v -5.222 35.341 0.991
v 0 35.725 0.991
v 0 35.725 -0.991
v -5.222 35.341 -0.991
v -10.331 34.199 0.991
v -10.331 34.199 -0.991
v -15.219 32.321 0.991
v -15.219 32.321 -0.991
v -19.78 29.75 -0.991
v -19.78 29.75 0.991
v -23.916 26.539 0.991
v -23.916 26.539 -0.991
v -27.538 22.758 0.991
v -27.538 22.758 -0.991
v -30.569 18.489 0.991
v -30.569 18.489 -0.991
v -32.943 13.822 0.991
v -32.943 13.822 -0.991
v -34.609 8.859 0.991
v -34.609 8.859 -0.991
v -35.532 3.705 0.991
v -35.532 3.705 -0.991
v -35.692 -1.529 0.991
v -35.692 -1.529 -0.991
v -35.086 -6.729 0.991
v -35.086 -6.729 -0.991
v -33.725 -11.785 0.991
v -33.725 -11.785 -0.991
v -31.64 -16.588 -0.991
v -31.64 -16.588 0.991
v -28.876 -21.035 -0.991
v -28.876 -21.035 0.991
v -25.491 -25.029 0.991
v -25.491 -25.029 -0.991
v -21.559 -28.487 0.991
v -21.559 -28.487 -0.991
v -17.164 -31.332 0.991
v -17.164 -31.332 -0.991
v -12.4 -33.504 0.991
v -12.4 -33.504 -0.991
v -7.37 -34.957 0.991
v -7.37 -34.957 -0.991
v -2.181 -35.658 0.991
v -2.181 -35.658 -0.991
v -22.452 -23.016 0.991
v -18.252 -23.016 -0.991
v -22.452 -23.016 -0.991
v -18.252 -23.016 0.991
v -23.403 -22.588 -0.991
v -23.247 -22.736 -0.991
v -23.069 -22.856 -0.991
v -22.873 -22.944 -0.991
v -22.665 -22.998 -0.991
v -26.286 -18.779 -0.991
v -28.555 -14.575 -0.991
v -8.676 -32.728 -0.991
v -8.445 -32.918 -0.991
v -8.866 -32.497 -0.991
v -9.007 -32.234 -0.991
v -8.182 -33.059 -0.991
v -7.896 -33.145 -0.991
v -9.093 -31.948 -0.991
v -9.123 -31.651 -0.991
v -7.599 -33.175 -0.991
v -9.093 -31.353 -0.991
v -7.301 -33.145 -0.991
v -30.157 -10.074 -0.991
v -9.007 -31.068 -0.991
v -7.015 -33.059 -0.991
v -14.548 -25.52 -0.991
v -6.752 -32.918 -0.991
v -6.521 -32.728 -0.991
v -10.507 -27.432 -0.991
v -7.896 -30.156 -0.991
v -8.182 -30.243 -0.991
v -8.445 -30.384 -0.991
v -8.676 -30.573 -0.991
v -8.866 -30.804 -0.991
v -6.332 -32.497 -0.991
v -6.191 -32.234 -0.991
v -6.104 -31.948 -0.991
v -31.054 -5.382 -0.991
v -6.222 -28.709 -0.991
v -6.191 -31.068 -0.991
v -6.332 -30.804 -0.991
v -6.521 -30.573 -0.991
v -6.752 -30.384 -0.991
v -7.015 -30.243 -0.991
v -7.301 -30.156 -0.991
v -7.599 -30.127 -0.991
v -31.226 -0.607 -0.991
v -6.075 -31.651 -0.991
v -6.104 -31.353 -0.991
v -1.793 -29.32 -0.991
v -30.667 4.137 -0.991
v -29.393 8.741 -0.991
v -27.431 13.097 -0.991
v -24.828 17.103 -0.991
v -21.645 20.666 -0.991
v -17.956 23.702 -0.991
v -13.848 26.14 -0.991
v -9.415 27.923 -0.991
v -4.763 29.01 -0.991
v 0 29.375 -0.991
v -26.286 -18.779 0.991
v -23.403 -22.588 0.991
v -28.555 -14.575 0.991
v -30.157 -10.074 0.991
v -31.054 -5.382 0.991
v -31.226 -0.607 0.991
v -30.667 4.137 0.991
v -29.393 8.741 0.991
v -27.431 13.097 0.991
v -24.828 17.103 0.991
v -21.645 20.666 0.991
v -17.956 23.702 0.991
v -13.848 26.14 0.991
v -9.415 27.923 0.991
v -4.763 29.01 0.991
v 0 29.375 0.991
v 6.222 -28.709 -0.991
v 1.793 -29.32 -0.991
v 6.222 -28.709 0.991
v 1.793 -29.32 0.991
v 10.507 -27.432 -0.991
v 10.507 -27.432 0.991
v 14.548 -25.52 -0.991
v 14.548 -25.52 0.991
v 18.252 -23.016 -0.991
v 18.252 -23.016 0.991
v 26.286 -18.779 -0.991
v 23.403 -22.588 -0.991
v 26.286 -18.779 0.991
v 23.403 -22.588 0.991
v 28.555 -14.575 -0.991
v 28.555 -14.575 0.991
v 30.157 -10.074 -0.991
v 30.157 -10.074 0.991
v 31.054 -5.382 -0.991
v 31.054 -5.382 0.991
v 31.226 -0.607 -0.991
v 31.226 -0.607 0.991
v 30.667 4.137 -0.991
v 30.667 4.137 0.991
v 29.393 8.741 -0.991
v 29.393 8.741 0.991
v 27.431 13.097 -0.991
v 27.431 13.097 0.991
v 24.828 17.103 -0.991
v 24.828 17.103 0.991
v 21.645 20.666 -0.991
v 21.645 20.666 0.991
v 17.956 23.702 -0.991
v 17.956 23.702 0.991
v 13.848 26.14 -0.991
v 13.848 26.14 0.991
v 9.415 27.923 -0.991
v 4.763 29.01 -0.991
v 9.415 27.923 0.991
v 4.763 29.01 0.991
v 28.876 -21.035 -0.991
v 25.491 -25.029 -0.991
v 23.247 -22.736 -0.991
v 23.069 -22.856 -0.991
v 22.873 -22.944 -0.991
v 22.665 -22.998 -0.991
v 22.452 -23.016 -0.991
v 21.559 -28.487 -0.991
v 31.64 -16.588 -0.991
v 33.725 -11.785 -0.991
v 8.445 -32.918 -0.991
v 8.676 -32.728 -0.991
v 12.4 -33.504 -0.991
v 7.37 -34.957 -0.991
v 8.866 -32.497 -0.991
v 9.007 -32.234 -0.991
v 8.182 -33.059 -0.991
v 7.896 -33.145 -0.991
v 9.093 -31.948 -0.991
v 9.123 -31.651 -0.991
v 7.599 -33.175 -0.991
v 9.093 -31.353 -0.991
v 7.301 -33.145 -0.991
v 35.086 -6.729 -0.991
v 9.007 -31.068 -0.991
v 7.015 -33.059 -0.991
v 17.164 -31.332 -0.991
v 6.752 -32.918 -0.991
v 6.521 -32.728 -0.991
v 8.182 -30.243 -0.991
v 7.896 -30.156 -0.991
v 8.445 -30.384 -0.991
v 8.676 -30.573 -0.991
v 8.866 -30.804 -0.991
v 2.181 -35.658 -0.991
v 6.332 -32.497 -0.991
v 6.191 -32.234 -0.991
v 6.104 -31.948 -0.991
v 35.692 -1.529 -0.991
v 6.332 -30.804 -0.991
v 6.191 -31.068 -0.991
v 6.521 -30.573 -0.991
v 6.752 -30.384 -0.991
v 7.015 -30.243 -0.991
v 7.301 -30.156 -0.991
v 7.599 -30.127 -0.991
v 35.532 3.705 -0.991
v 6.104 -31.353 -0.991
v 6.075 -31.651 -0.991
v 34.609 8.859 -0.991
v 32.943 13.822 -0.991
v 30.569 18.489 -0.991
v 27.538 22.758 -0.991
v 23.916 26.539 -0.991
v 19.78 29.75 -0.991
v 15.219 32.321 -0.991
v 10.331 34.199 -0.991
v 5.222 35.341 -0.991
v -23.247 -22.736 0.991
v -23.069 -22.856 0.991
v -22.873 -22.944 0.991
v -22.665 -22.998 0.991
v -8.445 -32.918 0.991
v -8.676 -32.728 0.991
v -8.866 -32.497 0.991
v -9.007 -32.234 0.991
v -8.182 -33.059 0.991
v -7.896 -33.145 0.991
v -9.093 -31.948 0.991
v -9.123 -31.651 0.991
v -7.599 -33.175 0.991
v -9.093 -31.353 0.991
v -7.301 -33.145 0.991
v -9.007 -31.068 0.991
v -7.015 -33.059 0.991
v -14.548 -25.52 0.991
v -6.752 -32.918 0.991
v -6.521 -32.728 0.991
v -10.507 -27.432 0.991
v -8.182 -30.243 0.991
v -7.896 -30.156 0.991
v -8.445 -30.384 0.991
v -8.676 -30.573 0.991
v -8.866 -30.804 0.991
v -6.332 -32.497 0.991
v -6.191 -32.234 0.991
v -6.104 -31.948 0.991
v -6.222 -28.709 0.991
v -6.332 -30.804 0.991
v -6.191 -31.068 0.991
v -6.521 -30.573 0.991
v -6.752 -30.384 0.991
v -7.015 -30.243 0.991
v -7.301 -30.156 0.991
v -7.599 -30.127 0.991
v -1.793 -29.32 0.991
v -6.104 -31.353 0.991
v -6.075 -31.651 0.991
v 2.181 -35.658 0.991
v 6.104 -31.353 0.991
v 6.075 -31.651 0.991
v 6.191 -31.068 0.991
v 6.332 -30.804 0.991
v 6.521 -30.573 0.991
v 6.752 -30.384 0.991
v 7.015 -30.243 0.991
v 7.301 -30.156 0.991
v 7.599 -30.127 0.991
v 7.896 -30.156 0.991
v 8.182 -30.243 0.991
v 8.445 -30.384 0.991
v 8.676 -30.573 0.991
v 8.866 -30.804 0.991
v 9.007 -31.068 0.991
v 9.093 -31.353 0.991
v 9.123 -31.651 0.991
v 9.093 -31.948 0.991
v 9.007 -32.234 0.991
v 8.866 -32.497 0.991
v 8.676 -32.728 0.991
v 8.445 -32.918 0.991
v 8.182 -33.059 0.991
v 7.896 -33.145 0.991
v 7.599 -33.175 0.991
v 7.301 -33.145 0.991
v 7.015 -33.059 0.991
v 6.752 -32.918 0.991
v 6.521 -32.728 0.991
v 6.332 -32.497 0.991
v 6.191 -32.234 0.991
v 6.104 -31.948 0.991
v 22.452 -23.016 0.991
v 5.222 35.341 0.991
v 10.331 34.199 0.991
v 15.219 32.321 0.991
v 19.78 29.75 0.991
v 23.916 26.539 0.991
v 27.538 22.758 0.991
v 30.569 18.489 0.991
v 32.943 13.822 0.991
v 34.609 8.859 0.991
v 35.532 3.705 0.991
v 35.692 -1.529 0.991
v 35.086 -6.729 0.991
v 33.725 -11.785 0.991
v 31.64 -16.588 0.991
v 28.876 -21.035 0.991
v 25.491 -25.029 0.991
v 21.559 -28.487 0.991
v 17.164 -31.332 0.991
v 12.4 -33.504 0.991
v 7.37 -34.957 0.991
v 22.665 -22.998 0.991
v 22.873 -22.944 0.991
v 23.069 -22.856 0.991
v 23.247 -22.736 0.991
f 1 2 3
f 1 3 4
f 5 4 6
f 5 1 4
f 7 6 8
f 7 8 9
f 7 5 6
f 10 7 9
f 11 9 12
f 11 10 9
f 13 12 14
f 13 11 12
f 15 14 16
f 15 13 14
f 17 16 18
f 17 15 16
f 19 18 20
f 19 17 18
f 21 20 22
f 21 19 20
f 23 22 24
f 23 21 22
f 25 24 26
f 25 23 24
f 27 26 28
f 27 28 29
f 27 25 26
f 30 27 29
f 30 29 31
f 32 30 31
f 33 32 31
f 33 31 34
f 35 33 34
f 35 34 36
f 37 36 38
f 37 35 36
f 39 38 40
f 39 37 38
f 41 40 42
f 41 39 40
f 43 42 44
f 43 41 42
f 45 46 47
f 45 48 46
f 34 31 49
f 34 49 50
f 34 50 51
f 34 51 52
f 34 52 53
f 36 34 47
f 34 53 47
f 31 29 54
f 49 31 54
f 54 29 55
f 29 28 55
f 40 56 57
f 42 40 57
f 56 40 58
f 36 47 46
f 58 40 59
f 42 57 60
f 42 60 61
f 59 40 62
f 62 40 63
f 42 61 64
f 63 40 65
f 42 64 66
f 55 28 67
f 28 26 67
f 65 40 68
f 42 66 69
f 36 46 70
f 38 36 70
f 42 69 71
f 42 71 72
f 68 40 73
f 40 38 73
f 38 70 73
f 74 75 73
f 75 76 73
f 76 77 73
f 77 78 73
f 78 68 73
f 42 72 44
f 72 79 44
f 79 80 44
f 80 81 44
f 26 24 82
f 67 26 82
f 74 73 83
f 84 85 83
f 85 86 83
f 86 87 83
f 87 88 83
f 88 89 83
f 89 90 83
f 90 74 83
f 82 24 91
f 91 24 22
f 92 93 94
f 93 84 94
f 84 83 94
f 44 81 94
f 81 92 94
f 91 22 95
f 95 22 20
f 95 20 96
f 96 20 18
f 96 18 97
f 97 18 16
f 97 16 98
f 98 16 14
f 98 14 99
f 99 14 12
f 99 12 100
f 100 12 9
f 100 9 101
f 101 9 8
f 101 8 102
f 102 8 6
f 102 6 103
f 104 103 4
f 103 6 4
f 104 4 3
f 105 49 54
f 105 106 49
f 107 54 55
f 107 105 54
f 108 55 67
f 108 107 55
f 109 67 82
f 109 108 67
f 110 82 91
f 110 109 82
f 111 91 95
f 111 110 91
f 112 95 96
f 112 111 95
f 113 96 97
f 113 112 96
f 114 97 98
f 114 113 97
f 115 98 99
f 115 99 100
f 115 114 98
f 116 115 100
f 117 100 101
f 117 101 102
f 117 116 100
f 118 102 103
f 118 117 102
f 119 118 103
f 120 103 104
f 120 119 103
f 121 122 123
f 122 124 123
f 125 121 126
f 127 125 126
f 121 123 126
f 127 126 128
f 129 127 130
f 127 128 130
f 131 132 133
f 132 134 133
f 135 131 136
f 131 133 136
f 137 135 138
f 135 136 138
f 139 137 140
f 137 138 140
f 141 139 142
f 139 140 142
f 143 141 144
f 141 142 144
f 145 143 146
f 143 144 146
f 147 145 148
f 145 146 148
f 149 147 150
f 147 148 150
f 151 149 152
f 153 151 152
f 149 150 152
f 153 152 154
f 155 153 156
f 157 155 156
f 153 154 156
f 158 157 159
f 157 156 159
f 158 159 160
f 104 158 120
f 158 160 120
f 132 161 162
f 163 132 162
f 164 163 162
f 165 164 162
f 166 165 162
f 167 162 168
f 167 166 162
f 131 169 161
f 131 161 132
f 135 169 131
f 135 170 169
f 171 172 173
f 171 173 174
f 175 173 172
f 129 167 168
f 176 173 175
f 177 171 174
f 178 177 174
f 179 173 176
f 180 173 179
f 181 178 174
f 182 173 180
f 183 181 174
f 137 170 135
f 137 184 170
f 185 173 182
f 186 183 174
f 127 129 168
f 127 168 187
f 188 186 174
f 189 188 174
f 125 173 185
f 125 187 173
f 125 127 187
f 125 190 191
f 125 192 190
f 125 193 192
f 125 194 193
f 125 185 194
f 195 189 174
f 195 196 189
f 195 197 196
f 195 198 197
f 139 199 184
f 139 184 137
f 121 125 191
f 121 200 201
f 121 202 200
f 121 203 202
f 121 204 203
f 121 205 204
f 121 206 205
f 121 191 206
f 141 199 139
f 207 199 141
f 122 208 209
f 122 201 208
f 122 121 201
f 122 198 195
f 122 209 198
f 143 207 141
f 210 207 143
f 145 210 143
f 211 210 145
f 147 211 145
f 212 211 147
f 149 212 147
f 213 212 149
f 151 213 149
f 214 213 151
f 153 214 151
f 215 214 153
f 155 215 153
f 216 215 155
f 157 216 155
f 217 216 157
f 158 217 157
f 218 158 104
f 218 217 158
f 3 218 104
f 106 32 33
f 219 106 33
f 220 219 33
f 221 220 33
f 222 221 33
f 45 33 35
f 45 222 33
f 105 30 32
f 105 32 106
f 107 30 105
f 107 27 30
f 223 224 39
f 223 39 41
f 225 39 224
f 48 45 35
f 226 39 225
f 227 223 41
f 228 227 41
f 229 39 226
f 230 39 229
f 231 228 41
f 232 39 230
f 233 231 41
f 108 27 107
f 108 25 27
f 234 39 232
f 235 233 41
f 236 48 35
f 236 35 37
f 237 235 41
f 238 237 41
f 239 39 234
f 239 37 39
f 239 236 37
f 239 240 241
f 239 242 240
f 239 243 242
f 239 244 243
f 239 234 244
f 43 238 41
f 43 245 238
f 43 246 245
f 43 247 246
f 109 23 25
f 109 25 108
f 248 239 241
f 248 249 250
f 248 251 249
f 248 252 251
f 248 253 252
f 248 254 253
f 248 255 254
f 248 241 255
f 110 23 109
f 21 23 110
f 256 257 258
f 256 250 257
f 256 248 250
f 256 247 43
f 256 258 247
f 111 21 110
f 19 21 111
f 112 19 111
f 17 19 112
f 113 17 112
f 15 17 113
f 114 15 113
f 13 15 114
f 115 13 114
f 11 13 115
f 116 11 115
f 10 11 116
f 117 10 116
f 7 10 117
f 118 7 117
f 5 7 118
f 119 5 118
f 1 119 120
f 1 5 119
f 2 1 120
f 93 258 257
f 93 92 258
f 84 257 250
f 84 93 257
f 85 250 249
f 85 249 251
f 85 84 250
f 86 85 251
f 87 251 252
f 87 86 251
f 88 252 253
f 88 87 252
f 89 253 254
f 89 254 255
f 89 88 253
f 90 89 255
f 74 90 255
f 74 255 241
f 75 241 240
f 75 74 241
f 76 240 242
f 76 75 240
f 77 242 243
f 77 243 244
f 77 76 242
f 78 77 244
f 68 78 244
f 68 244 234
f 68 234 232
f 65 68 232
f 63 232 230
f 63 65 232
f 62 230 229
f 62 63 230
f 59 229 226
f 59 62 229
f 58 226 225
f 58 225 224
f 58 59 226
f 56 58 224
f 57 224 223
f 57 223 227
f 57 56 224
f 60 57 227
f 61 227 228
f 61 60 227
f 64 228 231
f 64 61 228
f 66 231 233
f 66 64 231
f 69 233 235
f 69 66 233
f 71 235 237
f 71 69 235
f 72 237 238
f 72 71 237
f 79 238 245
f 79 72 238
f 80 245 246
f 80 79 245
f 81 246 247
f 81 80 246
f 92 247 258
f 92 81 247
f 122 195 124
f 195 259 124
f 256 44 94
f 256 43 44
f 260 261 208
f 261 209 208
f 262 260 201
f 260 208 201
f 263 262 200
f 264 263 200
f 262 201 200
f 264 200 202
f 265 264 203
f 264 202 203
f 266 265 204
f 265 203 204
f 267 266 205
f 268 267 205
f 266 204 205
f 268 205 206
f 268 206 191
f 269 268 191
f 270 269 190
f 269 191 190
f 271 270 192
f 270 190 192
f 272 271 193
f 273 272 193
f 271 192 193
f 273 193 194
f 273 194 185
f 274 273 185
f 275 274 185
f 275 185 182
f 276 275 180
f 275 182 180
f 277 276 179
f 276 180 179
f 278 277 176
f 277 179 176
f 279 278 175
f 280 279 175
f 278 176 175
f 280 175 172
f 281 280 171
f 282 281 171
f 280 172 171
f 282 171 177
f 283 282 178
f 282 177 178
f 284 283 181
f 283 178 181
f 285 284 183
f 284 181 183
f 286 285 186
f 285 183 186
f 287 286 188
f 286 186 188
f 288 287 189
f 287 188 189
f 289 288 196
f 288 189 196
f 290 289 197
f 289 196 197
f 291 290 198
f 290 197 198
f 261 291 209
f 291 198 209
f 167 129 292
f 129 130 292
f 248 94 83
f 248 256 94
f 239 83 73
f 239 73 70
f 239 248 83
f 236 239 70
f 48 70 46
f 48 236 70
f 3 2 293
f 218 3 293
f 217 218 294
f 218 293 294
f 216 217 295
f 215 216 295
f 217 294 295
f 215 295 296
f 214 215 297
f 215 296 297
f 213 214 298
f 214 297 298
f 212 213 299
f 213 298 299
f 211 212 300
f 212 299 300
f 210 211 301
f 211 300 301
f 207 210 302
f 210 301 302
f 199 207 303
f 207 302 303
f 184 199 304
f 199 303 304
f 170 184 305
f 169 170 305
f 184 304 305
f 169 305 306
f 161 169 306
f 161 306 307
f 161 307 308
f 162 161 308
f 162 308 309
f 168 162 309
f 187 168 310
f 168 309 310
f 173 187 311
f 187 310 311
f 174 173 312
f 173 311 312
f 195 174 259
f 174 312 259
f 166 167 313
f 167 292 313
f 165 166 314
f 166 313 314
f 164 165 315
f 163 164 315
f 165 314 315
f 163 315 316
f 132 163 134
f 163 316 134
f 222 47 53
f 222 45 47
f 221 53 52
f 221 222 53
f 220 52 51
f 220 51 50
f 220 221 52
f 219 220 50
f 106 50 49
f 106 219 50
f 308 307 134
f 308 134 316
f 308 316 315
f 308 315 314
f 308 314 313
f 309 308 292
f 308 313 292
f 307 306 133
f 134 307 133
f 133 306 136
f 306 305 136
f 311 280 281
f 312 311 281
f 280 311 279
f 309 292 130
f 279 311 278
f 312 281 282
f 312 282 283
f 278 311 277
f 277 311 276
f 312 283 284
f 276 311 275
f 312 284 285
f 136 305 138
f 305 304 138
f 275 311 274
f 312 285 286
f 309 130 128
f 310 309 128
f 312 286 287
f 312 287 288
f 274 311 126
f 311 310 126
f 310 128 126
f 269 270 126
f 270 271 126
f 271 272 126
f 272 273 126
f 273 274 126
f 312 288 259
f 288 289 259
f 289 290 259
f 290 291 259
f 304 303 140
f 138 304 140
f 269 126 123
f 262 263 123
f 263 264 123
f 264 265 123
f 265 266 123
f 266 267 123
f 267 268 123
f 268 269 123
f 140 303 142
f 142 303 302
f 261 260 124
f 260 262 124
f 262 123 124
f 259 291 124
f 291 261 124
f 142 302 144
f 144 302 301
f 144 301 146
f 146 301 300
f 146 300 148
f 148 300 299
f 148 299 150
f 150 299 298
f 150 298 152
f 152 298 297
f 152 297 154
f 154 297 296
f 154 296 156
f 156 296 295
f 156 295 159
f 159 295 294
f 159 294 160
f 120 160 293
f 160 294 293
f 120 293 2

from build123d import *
from build123d.topology import SkipClean

# Parameters (mm, degrees)
SKETCH4_R           = 1.524
BOSS_EXTRUDE1_DEPTH = 0.9906
FILLET1_R           = 1.27


with BuildPart() as part:
    # Sketch4 → Boss-Extrude1 (new, symmetric)
    with BuildSketch(Plane.XY):
        with BuildLine():
            Line((-18.252177815, -23.016396438), (-23.016396438, -23.016396438))
            ThreePointArc((-23.016396438, -23.016396438), (-28.612162641, 10.693388458), (0, 29.3751))
            Line((0, 29.3751), (0, 35.7251))
            ThreePointArc((0, 35.7251), (-35.708437486, 1.090991438), (-2.18096518, -35.658465487))
            Line((-2.18096518, -35.658465487), (-1.793306954, -29.320309517))
            ThreePointArc((-1.793306954, -29.320309517), (-10.506673828, -27.431848371), (-18.252177815, -23.016396438))
        make_face()
        with Locations((-7.598669938, -31.650738146)):
            Circle(SKETCH4_R, mode=Mode.SUBTRACT)
    extrude(amount=BOSS_EXTRUDE1_DEPTH, both=True)

    # Fillet1
    fillet1_edges = [part.edges().sort_by_distance(p)[0] for p in [
        (-23.016396438, -23.016396438, 0),
    ]]
    fillet(fillet1_edges, radius=FILLET1_R)

    # Mirror1: part across plane


with BuildPart() as part_1:
    with SkipClean():  # the faces are left unmerged after this step: merging them gives an invalid solid
        add(part.part)
        add(part.part.mirror(Plane(origin=(0, 0, 0), x_dir=(0, 0, 1), z_dir=(1, 0, 0))))


solid = part_1.part
